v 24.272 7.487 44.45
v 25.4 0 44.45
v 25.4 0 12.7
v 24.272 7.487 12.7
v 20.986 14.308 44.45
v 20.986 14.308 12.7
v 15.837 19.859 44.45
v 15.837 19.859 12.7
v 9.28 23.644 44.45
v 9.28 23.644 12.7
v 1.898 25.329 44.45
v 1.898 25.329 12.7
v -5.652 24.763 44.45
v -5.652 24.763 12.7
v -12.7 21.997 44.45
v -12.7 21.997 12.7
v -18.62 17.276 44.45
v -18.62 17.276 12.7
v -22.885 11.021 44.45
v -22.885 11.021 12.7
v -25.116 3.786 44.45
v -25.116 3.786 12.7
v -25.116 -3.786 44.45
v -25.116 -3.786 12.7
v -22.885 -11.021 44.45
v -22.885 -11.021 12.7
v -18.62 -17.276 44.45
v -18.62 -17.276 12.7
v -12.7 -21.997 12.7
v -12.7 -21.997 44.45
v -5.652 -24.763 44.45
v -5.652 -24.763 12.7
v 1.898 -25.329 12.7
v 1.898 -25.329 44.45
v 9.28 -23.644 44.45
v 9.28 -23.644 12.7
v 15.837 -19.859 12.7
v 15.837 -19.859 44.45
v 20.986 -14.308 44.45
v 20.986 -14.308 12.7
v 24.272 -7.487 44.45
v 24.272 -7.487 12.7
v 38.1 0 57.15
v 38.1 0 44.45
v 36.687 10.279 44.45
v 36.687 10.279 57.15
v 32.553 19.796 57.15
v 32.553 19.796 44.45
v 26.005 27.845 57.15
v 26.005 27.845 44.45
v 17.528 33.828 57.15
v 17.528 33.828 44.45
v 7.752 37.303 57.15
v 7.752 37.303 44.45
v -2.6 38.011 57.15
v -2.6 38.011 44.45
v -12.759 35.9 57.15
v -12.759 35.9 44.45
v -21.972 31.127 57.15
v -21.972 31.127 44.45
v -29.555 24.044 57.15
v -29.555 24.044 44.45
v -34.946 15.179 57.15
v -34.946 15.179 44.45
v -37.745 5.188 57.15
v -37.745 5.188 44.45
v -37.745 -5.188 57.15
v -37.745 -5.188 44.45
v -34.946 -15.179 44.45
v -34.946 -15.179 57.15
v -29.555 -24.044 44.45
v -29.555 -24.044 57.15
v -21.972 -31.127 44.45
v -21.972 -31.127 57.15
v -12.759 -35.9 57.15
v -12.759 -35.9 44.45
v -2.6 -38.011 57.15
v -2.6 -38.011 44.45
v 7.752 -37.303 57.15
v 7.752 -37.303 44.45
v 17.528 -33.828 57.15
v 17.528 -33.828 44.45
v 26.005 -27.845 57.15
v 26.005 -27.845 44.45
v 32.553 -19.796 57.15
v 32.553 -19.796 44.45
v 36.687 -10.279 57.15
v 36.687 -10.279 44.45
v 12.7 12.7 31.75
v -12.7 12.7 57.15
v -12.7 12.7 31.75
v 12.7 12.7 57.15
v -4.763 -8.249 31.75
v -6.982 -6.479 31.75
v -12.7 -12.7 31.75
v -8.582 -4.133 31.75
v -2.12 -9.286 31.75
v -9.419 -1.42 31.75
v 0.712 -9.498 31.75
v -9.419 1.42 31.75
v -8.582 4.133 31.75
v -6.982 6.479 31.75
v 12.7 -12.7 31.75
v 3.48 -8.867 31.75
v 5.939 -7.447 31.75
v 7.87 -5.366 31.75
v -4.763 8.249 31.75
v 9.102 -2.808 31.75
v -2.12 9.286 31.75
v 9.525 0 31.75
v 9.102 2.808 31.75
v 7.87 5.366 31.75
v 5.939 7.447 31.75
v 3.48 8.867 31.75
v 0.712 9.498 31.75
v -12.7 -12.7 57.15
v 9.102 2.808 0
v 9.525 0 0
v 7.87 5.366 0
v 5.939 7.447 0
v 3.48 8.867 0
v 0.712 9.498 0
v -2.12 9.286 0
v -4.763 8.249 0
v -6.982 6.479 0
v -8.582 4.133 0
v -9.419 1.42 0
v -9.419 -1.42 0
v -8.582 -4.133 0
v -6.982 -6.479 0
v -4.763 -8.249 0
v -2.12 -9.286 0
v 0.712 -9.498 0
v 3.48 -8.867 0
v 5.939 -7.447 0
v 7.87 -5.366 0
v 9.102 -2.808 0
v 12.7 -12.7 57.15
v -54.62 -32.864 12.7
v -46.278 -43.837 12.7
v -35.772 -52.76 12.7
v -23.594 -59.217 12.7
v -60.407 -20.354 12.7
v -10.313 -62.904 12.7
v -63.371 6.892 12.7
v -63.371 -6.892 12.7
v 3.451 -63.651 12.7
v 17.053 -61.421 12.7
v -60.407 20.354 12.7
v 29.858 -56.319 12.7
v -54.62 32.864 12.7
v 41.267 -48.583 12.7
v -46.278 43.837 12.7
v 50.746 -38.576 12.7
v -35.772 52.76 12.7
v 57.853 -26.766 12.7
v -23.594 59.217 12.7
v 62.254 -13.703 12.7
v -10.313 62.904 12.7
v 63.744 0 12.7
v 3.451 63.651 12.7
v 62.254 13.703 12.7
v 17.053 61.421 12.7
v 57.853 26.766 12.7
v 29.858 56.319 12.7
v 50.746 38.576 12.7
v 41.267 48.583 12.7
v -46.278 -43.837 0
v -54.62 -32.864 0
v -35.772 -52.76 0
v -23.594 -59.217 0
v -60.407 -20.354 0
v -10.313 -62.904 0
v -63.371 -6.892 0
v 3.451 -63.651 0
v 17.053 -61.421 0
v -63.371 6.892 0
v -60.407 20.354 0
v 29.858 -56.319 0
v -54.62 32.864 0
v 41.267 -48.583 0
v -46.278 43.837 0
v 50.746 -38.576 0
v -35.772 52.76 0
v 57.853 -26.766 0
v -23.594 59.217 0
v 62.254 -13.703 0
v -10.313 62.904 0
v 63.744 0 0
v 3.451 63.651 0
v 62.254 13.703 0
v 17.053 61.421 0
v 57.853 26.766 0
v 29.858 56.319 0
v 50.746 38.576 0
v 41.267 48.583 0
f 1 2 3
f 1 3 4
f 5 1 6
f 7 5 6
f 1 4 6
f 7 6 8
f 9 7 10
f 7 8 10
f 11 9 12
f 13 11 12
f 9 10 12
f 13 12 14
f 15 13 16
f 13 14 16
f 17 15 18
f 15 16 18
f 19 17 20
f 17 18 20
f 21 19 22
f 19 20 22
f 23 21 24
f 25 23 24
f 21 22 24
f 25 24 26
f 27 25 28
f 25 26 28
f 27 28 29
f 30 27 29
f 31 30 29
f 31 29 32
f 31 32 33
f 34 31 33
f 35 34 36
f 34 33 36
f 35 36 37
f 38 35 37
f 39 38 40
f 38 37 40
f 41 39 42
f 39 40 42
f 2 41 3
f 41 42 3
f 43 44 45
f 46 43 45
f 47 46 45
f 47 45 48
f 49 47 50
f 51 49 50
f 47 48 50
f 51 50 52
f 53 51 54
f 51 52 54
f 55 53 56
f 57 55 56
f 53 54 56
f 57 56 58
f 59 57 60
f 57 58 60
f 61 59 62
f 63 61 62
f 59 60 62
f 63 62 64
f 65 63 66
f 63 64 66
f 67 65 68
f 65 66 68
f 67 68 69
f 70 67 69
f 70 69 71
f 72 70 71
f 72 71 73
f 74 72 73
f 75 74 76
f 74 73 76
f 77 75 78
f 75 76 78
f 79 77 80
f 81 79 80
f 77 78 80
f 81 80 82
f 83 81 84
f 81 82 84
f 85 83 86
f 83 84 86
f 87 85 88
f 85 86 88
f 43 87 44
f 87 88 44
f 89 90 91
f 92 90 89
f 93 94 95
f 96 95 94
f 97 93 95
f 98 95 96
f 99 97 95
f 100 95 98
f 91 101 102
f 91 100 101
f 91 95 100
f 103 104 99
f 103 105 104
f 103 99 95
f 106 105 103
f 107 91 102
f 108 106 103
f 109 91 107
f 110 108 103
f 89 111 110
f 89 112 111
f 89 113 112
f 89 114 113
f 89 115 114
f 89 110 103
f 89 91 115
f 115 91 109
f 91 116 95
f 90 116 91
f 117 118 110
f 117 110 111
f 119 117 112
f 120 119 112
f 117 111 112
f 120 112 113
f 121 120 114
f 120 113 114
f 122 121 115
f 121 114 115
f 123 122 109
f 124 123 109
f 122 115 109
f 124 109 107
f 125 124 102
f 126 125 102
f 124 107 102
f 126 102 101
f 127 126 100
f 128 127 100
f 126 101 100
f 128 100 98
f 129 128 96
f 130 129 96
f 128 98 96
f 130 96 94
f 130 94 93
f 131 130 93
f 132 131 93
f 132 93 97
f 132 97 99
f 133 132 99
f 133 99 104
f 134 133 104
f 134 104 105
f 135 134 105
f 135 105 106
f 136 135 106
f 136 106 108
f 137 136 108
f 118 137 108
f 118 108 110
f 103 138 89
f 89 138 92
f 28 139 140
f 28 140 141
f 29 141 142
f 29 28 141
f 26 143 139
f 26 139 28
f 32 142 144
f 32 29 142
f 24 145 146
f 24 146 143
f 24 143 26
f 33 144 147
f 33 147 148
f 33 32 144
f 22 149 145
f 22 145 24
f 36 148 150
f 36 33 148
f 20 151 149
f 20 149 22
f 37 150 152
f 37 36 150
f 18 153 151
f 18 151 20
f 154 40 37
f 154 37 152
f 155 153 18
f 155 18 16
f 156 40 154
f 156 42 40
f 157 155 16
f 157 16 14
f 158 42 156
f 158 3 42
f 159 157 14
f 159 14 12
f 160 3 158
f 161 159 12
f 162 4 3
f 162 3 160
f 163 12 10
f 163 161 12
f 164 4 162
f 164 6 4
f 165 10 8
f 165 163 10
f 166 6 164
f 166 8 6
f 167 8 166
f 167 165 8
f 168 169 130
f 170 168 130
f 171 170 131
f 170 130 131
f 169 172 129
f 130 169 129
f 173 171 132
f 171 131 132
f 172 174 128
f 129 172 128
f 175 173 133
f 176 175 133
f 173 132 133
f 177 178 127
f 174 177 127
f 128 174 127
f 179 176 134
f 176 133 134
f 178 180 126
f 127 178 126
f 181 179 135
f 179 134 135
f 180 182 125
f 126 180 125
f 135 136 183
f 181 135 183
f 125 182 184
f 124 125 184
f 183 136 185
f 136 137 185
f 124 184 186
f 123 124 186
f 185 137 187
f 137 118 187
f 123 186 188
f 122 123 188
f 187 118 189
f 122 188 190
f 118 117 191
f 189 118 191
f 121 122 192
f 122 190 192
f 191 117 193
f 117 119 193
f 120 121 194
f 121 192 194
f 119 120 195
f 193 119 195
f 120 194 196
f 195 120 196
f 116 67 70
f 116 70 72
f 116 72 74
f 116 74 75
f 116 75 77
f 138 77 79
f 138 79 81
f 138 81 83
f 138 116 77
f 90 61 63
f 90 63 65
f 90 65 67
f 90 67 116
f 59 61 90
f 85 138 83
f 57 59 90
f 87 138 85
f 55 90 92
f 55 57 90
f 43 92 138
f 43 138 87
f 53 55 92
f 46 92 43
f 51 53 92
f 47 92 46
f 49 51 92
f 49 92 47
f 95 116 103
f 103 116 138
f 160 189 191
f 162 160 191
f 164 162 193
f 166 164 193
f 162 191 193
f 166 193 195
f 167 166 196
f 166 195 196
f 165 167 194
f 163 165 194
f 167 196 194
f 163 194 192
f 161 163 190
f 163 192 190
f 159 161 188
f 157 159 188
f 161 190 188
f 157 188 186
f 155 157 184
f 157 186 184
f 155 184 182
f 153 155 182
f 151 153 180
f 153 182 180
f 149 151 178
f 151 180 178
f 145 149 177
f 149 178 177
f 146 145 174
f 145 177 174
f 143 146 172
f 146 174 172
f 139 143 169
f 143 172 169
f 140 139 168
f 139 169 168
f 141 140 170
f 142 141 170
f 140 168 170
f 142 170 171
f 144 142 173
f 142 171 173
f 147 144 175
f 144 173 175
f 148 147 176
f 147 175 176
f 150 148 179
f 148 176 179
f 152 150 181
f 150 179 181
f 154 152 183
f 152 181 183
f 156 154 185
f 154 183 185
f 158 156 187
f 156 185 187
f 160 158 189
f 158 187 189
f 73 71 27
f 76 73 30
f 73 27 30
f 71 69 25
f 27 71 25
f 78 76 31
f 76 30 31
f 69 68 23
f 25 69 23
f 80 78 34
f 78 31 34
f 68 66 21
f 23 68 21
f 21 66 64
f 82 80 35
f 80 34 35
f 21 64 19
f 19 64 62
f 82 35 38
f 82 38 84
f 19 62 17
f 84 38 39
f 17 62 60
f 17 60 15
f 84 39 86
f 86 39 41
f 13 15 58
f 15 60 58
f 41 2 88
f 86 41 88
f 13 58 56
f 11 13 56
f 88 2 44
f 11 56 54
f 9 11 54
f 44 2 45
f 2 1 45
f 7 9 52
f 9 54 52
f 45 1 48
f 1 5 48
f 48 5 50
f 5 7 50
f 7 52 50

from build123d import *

# Parameters (mm, degrees)
F0_R      = 63.7442234454
F1_DEPTH  = 12.7
F2_R      = 25.4
F3_DEPTH  = 19.05
F4_R      = 9.525
F5_DEPTH  = 50.8
F6_DEPTH  = 12.7
F7_R      = 38.1
F8_DEPTH  = 12.7
F9_W      = 25.4
F9_H      = 25.4
F10_DEPTH = 25.4


with BuildPart() as f1:
    # F0 (on Top) → F1 (new body)
    with BuildSketch(Plane.XY):
        Circle(F0_R)
    extrude(amount=F1_DEPTH)

    # F2 (on face) → F3 (join)
    with BuildSketch(Plane.XY.offset(12.7)):
        Circle(F2_R)
    extrude(amount=F3_DEPTH)

    # F4 (on face) → F5 (cut)
    with BuildSketch(Plane.XY.offset(31.75)):
        Circle(F4_R)
    extrude(amount=-F5_DEPTH, mode=Mode.SUBTRACT)

    # F6 (add): a face of the model
    f6_faces = [f1.faces().sort_by_distance(p)[0] for p in [
        (-24.6815795103, 0, 31.75),
    ]]
    extrude(f6_faces, amount=F6_DEPTH)

    # F7 (on face) → F8 (join)
    with BuildSketch(Plane.XY.offset(44.45)):
        Circle(F7_R)
    extrude(amount=F8_DEPTH)

    # F9 (on face) → F10 (cut)
    with BuildSketch(Plane.XY.offset(57.15)):
        Rectangle(F9_W, F9_H)
    extrude(amount=-F10_DEPTH, mode=Mode.SUBTRACT)


solid = f1.part
